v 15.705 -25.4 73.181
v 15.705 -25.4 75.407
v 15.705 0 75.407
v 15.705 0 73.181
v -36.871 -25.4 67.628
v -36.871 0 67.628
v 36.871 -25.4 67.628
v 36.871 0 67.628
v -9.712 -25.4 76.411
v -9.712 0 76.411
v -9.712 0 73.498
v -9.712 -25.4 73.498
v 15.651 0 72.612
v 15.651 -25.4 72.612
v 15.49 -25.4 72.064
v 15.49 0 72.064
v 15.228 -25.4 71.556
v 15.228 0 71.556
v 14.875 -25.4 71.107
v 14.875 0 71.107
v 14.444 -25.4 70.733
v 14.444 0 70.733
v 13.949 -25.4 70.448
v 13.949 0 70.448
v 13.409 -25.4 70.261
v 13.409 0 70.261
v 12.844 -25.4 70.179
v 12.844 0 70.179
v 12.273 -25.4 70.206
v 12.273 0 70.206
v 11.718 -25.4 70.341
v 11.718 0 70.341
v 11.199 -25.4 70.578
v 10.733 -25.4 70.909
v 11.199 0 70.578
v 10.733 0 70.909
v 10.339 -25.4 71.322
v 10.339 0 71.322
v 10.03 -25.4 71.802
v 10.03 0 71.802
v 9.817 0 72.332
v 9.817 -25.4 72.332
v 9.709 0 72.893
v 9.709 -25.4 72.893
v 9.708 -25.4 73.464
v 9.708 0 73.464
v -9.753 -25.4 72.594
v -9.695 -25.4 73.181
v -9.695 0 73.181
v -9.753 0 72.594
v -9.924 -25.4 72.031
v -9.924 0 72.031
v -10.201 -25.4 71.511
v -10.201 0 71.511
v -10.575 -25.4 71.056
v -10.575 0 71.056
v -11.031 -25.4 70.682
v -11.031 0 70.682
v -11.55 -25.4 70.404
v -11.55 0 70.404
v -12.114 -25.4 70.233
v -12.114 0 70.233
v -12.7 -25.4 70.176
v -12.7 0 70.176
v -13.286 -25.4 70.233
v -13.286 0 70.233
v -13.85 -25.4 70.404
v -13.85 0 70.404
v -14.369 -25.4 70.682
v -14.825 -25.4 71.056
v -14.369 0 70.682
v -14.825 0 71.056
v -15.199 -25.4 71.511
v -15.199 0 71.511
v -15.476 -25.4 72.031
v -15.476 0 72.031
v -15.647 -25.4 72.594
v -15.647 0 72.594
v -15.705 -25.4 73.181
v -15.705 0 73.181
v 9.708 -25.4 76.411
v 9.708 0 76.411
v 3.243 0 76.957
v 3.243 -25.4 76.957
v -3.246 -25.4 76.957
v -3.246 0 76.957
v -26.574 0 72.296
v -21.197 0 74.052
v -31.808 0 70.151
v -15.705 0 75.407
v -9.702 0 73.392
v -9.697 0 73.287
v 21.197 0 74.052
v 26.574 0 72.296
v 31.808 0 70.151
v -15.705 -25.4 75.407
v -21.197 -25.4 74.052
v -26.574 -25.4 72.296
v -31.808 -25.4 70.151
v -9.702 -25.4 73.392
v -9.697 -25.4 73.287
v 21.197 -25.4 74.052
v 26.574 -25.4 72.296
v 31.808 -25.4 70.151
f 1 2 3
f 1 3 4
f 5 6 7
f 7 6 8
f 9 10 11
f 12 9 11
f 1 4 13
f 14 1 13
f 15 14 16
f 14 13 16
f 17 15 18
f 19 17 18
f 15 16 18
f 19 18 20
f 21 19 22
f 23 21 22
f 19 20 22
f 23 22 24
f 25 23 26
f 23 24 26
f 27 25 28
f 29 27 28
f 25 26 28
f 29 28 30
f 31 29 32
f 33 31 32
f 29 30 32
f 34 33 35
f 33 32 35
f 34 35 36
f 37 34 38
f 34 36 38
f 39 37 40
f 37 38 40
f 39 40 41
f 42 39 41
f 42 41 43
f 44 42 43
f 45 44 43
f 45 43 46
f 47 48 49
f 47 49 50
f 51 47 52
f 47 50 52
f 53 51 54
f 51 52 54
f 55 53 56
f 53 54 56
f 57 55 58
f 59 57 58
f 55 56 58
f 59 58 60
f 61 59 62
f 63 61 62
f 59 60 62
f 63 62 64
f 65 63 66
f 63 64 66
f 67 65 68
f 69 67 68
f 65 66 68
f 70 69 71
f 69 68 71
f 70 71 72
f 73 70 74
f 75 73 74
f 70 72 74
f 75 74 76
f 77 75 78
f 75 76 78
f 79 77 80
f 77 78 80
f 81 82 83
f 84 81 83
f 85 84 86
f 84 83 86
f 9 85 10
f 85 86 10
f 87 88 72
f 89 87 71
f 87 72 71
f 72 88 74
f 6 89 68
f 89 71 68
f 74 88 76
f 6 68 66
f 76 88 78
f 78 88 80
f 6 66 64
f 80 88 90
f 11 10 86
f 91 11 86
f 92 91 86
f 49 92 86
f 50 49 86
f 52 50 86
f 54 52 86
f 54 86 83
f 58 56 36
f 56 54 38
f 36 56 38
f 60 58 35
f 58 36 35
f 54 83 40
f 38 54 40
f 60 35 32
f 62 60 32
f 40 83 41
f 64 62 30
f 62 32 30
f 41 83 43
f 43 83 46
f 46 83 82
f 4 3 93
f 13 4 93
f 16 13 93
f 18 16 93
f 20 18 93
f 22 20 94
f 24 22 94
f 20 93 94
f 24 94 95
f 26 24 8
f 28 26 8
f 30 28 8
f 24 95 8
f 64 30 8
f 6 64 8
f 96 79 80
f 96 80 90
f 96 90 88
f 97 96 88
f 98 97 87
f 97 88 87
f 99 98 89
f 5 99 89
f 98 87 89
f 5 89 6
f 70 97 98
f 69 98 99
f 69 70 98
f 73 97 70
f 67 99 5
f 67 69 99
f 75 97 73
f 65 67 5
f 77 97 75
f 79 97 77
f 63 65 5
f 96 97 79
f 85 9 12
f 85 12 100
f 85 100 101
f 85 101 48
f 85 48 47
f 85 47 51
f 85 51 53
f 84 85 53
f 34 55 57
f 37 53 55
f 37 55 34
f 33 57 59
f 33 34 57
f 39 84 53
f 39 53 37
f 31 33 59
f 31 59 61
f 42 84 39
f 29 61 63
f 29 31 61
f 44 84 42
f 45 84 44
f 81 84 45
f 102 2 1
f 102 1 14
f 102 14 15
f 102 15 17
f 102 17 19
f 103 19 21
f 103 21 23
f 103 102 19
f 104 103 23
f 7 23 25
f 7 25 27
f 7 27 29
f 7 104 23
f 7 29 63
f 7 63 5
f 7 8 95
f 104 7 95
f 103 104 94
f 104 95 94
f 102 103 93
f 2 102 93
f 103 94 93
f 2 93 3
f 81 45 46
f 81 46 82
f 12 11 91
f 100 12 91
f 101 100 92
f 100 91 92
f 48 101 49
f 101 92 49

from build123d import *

# Parameters (mm, degrees)
F1_DEPTH = 25.4


with BuildPart() as f1:
    # F0 (on Front) → F1 (new body)
    with BuildSketch(Plane.XZ):
        with BuildLine():
            Line((-36.8707050923, 67.6275), (36.8707050923, 67.6275))
            ThreePointArc((36.8707050923, 67.6275), (26.5741043582, 72.2962283097), (15.705, 75.4074308358))
            Line((15.705, 75.4074308358), (15.705, 73.1806760713))
            ThreePointArc((15.705, 73.1806760713), (12.5580129473, 70.1790324087), (9.7084178523, 73.4643330011))
            Line((9.7084178523, 73.4643330011), (9.7084178523, 76.4112182409))
            ThreePointArc((9.7084178523, 76.4112182409), (-0.0017087982, 77.025499981), (-9.7118081837, 76.4107874063))
            Line((-9.7118081837, 76.4107874063), (-9.7118081837, 73.498063325))
            ThreePointArc((-9.7118081837, 73.498063325), (-9.699204988, 73.3395920741), (-9.695, 73.1806760713))
            ThreePointArc((-9.695, 73.1806760713), (-12.7, 70.1756760713), (-15.705, 73.1806760713))
            Line((-15.705, 73.1806760713), (-15.705, 75.4074308358))
            ThreePointArc((-15.705, 75.4074308358), (-26.5741043582, 72.2962283097), (-36.8707050923, 67.6275))
        make_face()
    extrude(amount=F1_DEPTH)


solid = f1.part
